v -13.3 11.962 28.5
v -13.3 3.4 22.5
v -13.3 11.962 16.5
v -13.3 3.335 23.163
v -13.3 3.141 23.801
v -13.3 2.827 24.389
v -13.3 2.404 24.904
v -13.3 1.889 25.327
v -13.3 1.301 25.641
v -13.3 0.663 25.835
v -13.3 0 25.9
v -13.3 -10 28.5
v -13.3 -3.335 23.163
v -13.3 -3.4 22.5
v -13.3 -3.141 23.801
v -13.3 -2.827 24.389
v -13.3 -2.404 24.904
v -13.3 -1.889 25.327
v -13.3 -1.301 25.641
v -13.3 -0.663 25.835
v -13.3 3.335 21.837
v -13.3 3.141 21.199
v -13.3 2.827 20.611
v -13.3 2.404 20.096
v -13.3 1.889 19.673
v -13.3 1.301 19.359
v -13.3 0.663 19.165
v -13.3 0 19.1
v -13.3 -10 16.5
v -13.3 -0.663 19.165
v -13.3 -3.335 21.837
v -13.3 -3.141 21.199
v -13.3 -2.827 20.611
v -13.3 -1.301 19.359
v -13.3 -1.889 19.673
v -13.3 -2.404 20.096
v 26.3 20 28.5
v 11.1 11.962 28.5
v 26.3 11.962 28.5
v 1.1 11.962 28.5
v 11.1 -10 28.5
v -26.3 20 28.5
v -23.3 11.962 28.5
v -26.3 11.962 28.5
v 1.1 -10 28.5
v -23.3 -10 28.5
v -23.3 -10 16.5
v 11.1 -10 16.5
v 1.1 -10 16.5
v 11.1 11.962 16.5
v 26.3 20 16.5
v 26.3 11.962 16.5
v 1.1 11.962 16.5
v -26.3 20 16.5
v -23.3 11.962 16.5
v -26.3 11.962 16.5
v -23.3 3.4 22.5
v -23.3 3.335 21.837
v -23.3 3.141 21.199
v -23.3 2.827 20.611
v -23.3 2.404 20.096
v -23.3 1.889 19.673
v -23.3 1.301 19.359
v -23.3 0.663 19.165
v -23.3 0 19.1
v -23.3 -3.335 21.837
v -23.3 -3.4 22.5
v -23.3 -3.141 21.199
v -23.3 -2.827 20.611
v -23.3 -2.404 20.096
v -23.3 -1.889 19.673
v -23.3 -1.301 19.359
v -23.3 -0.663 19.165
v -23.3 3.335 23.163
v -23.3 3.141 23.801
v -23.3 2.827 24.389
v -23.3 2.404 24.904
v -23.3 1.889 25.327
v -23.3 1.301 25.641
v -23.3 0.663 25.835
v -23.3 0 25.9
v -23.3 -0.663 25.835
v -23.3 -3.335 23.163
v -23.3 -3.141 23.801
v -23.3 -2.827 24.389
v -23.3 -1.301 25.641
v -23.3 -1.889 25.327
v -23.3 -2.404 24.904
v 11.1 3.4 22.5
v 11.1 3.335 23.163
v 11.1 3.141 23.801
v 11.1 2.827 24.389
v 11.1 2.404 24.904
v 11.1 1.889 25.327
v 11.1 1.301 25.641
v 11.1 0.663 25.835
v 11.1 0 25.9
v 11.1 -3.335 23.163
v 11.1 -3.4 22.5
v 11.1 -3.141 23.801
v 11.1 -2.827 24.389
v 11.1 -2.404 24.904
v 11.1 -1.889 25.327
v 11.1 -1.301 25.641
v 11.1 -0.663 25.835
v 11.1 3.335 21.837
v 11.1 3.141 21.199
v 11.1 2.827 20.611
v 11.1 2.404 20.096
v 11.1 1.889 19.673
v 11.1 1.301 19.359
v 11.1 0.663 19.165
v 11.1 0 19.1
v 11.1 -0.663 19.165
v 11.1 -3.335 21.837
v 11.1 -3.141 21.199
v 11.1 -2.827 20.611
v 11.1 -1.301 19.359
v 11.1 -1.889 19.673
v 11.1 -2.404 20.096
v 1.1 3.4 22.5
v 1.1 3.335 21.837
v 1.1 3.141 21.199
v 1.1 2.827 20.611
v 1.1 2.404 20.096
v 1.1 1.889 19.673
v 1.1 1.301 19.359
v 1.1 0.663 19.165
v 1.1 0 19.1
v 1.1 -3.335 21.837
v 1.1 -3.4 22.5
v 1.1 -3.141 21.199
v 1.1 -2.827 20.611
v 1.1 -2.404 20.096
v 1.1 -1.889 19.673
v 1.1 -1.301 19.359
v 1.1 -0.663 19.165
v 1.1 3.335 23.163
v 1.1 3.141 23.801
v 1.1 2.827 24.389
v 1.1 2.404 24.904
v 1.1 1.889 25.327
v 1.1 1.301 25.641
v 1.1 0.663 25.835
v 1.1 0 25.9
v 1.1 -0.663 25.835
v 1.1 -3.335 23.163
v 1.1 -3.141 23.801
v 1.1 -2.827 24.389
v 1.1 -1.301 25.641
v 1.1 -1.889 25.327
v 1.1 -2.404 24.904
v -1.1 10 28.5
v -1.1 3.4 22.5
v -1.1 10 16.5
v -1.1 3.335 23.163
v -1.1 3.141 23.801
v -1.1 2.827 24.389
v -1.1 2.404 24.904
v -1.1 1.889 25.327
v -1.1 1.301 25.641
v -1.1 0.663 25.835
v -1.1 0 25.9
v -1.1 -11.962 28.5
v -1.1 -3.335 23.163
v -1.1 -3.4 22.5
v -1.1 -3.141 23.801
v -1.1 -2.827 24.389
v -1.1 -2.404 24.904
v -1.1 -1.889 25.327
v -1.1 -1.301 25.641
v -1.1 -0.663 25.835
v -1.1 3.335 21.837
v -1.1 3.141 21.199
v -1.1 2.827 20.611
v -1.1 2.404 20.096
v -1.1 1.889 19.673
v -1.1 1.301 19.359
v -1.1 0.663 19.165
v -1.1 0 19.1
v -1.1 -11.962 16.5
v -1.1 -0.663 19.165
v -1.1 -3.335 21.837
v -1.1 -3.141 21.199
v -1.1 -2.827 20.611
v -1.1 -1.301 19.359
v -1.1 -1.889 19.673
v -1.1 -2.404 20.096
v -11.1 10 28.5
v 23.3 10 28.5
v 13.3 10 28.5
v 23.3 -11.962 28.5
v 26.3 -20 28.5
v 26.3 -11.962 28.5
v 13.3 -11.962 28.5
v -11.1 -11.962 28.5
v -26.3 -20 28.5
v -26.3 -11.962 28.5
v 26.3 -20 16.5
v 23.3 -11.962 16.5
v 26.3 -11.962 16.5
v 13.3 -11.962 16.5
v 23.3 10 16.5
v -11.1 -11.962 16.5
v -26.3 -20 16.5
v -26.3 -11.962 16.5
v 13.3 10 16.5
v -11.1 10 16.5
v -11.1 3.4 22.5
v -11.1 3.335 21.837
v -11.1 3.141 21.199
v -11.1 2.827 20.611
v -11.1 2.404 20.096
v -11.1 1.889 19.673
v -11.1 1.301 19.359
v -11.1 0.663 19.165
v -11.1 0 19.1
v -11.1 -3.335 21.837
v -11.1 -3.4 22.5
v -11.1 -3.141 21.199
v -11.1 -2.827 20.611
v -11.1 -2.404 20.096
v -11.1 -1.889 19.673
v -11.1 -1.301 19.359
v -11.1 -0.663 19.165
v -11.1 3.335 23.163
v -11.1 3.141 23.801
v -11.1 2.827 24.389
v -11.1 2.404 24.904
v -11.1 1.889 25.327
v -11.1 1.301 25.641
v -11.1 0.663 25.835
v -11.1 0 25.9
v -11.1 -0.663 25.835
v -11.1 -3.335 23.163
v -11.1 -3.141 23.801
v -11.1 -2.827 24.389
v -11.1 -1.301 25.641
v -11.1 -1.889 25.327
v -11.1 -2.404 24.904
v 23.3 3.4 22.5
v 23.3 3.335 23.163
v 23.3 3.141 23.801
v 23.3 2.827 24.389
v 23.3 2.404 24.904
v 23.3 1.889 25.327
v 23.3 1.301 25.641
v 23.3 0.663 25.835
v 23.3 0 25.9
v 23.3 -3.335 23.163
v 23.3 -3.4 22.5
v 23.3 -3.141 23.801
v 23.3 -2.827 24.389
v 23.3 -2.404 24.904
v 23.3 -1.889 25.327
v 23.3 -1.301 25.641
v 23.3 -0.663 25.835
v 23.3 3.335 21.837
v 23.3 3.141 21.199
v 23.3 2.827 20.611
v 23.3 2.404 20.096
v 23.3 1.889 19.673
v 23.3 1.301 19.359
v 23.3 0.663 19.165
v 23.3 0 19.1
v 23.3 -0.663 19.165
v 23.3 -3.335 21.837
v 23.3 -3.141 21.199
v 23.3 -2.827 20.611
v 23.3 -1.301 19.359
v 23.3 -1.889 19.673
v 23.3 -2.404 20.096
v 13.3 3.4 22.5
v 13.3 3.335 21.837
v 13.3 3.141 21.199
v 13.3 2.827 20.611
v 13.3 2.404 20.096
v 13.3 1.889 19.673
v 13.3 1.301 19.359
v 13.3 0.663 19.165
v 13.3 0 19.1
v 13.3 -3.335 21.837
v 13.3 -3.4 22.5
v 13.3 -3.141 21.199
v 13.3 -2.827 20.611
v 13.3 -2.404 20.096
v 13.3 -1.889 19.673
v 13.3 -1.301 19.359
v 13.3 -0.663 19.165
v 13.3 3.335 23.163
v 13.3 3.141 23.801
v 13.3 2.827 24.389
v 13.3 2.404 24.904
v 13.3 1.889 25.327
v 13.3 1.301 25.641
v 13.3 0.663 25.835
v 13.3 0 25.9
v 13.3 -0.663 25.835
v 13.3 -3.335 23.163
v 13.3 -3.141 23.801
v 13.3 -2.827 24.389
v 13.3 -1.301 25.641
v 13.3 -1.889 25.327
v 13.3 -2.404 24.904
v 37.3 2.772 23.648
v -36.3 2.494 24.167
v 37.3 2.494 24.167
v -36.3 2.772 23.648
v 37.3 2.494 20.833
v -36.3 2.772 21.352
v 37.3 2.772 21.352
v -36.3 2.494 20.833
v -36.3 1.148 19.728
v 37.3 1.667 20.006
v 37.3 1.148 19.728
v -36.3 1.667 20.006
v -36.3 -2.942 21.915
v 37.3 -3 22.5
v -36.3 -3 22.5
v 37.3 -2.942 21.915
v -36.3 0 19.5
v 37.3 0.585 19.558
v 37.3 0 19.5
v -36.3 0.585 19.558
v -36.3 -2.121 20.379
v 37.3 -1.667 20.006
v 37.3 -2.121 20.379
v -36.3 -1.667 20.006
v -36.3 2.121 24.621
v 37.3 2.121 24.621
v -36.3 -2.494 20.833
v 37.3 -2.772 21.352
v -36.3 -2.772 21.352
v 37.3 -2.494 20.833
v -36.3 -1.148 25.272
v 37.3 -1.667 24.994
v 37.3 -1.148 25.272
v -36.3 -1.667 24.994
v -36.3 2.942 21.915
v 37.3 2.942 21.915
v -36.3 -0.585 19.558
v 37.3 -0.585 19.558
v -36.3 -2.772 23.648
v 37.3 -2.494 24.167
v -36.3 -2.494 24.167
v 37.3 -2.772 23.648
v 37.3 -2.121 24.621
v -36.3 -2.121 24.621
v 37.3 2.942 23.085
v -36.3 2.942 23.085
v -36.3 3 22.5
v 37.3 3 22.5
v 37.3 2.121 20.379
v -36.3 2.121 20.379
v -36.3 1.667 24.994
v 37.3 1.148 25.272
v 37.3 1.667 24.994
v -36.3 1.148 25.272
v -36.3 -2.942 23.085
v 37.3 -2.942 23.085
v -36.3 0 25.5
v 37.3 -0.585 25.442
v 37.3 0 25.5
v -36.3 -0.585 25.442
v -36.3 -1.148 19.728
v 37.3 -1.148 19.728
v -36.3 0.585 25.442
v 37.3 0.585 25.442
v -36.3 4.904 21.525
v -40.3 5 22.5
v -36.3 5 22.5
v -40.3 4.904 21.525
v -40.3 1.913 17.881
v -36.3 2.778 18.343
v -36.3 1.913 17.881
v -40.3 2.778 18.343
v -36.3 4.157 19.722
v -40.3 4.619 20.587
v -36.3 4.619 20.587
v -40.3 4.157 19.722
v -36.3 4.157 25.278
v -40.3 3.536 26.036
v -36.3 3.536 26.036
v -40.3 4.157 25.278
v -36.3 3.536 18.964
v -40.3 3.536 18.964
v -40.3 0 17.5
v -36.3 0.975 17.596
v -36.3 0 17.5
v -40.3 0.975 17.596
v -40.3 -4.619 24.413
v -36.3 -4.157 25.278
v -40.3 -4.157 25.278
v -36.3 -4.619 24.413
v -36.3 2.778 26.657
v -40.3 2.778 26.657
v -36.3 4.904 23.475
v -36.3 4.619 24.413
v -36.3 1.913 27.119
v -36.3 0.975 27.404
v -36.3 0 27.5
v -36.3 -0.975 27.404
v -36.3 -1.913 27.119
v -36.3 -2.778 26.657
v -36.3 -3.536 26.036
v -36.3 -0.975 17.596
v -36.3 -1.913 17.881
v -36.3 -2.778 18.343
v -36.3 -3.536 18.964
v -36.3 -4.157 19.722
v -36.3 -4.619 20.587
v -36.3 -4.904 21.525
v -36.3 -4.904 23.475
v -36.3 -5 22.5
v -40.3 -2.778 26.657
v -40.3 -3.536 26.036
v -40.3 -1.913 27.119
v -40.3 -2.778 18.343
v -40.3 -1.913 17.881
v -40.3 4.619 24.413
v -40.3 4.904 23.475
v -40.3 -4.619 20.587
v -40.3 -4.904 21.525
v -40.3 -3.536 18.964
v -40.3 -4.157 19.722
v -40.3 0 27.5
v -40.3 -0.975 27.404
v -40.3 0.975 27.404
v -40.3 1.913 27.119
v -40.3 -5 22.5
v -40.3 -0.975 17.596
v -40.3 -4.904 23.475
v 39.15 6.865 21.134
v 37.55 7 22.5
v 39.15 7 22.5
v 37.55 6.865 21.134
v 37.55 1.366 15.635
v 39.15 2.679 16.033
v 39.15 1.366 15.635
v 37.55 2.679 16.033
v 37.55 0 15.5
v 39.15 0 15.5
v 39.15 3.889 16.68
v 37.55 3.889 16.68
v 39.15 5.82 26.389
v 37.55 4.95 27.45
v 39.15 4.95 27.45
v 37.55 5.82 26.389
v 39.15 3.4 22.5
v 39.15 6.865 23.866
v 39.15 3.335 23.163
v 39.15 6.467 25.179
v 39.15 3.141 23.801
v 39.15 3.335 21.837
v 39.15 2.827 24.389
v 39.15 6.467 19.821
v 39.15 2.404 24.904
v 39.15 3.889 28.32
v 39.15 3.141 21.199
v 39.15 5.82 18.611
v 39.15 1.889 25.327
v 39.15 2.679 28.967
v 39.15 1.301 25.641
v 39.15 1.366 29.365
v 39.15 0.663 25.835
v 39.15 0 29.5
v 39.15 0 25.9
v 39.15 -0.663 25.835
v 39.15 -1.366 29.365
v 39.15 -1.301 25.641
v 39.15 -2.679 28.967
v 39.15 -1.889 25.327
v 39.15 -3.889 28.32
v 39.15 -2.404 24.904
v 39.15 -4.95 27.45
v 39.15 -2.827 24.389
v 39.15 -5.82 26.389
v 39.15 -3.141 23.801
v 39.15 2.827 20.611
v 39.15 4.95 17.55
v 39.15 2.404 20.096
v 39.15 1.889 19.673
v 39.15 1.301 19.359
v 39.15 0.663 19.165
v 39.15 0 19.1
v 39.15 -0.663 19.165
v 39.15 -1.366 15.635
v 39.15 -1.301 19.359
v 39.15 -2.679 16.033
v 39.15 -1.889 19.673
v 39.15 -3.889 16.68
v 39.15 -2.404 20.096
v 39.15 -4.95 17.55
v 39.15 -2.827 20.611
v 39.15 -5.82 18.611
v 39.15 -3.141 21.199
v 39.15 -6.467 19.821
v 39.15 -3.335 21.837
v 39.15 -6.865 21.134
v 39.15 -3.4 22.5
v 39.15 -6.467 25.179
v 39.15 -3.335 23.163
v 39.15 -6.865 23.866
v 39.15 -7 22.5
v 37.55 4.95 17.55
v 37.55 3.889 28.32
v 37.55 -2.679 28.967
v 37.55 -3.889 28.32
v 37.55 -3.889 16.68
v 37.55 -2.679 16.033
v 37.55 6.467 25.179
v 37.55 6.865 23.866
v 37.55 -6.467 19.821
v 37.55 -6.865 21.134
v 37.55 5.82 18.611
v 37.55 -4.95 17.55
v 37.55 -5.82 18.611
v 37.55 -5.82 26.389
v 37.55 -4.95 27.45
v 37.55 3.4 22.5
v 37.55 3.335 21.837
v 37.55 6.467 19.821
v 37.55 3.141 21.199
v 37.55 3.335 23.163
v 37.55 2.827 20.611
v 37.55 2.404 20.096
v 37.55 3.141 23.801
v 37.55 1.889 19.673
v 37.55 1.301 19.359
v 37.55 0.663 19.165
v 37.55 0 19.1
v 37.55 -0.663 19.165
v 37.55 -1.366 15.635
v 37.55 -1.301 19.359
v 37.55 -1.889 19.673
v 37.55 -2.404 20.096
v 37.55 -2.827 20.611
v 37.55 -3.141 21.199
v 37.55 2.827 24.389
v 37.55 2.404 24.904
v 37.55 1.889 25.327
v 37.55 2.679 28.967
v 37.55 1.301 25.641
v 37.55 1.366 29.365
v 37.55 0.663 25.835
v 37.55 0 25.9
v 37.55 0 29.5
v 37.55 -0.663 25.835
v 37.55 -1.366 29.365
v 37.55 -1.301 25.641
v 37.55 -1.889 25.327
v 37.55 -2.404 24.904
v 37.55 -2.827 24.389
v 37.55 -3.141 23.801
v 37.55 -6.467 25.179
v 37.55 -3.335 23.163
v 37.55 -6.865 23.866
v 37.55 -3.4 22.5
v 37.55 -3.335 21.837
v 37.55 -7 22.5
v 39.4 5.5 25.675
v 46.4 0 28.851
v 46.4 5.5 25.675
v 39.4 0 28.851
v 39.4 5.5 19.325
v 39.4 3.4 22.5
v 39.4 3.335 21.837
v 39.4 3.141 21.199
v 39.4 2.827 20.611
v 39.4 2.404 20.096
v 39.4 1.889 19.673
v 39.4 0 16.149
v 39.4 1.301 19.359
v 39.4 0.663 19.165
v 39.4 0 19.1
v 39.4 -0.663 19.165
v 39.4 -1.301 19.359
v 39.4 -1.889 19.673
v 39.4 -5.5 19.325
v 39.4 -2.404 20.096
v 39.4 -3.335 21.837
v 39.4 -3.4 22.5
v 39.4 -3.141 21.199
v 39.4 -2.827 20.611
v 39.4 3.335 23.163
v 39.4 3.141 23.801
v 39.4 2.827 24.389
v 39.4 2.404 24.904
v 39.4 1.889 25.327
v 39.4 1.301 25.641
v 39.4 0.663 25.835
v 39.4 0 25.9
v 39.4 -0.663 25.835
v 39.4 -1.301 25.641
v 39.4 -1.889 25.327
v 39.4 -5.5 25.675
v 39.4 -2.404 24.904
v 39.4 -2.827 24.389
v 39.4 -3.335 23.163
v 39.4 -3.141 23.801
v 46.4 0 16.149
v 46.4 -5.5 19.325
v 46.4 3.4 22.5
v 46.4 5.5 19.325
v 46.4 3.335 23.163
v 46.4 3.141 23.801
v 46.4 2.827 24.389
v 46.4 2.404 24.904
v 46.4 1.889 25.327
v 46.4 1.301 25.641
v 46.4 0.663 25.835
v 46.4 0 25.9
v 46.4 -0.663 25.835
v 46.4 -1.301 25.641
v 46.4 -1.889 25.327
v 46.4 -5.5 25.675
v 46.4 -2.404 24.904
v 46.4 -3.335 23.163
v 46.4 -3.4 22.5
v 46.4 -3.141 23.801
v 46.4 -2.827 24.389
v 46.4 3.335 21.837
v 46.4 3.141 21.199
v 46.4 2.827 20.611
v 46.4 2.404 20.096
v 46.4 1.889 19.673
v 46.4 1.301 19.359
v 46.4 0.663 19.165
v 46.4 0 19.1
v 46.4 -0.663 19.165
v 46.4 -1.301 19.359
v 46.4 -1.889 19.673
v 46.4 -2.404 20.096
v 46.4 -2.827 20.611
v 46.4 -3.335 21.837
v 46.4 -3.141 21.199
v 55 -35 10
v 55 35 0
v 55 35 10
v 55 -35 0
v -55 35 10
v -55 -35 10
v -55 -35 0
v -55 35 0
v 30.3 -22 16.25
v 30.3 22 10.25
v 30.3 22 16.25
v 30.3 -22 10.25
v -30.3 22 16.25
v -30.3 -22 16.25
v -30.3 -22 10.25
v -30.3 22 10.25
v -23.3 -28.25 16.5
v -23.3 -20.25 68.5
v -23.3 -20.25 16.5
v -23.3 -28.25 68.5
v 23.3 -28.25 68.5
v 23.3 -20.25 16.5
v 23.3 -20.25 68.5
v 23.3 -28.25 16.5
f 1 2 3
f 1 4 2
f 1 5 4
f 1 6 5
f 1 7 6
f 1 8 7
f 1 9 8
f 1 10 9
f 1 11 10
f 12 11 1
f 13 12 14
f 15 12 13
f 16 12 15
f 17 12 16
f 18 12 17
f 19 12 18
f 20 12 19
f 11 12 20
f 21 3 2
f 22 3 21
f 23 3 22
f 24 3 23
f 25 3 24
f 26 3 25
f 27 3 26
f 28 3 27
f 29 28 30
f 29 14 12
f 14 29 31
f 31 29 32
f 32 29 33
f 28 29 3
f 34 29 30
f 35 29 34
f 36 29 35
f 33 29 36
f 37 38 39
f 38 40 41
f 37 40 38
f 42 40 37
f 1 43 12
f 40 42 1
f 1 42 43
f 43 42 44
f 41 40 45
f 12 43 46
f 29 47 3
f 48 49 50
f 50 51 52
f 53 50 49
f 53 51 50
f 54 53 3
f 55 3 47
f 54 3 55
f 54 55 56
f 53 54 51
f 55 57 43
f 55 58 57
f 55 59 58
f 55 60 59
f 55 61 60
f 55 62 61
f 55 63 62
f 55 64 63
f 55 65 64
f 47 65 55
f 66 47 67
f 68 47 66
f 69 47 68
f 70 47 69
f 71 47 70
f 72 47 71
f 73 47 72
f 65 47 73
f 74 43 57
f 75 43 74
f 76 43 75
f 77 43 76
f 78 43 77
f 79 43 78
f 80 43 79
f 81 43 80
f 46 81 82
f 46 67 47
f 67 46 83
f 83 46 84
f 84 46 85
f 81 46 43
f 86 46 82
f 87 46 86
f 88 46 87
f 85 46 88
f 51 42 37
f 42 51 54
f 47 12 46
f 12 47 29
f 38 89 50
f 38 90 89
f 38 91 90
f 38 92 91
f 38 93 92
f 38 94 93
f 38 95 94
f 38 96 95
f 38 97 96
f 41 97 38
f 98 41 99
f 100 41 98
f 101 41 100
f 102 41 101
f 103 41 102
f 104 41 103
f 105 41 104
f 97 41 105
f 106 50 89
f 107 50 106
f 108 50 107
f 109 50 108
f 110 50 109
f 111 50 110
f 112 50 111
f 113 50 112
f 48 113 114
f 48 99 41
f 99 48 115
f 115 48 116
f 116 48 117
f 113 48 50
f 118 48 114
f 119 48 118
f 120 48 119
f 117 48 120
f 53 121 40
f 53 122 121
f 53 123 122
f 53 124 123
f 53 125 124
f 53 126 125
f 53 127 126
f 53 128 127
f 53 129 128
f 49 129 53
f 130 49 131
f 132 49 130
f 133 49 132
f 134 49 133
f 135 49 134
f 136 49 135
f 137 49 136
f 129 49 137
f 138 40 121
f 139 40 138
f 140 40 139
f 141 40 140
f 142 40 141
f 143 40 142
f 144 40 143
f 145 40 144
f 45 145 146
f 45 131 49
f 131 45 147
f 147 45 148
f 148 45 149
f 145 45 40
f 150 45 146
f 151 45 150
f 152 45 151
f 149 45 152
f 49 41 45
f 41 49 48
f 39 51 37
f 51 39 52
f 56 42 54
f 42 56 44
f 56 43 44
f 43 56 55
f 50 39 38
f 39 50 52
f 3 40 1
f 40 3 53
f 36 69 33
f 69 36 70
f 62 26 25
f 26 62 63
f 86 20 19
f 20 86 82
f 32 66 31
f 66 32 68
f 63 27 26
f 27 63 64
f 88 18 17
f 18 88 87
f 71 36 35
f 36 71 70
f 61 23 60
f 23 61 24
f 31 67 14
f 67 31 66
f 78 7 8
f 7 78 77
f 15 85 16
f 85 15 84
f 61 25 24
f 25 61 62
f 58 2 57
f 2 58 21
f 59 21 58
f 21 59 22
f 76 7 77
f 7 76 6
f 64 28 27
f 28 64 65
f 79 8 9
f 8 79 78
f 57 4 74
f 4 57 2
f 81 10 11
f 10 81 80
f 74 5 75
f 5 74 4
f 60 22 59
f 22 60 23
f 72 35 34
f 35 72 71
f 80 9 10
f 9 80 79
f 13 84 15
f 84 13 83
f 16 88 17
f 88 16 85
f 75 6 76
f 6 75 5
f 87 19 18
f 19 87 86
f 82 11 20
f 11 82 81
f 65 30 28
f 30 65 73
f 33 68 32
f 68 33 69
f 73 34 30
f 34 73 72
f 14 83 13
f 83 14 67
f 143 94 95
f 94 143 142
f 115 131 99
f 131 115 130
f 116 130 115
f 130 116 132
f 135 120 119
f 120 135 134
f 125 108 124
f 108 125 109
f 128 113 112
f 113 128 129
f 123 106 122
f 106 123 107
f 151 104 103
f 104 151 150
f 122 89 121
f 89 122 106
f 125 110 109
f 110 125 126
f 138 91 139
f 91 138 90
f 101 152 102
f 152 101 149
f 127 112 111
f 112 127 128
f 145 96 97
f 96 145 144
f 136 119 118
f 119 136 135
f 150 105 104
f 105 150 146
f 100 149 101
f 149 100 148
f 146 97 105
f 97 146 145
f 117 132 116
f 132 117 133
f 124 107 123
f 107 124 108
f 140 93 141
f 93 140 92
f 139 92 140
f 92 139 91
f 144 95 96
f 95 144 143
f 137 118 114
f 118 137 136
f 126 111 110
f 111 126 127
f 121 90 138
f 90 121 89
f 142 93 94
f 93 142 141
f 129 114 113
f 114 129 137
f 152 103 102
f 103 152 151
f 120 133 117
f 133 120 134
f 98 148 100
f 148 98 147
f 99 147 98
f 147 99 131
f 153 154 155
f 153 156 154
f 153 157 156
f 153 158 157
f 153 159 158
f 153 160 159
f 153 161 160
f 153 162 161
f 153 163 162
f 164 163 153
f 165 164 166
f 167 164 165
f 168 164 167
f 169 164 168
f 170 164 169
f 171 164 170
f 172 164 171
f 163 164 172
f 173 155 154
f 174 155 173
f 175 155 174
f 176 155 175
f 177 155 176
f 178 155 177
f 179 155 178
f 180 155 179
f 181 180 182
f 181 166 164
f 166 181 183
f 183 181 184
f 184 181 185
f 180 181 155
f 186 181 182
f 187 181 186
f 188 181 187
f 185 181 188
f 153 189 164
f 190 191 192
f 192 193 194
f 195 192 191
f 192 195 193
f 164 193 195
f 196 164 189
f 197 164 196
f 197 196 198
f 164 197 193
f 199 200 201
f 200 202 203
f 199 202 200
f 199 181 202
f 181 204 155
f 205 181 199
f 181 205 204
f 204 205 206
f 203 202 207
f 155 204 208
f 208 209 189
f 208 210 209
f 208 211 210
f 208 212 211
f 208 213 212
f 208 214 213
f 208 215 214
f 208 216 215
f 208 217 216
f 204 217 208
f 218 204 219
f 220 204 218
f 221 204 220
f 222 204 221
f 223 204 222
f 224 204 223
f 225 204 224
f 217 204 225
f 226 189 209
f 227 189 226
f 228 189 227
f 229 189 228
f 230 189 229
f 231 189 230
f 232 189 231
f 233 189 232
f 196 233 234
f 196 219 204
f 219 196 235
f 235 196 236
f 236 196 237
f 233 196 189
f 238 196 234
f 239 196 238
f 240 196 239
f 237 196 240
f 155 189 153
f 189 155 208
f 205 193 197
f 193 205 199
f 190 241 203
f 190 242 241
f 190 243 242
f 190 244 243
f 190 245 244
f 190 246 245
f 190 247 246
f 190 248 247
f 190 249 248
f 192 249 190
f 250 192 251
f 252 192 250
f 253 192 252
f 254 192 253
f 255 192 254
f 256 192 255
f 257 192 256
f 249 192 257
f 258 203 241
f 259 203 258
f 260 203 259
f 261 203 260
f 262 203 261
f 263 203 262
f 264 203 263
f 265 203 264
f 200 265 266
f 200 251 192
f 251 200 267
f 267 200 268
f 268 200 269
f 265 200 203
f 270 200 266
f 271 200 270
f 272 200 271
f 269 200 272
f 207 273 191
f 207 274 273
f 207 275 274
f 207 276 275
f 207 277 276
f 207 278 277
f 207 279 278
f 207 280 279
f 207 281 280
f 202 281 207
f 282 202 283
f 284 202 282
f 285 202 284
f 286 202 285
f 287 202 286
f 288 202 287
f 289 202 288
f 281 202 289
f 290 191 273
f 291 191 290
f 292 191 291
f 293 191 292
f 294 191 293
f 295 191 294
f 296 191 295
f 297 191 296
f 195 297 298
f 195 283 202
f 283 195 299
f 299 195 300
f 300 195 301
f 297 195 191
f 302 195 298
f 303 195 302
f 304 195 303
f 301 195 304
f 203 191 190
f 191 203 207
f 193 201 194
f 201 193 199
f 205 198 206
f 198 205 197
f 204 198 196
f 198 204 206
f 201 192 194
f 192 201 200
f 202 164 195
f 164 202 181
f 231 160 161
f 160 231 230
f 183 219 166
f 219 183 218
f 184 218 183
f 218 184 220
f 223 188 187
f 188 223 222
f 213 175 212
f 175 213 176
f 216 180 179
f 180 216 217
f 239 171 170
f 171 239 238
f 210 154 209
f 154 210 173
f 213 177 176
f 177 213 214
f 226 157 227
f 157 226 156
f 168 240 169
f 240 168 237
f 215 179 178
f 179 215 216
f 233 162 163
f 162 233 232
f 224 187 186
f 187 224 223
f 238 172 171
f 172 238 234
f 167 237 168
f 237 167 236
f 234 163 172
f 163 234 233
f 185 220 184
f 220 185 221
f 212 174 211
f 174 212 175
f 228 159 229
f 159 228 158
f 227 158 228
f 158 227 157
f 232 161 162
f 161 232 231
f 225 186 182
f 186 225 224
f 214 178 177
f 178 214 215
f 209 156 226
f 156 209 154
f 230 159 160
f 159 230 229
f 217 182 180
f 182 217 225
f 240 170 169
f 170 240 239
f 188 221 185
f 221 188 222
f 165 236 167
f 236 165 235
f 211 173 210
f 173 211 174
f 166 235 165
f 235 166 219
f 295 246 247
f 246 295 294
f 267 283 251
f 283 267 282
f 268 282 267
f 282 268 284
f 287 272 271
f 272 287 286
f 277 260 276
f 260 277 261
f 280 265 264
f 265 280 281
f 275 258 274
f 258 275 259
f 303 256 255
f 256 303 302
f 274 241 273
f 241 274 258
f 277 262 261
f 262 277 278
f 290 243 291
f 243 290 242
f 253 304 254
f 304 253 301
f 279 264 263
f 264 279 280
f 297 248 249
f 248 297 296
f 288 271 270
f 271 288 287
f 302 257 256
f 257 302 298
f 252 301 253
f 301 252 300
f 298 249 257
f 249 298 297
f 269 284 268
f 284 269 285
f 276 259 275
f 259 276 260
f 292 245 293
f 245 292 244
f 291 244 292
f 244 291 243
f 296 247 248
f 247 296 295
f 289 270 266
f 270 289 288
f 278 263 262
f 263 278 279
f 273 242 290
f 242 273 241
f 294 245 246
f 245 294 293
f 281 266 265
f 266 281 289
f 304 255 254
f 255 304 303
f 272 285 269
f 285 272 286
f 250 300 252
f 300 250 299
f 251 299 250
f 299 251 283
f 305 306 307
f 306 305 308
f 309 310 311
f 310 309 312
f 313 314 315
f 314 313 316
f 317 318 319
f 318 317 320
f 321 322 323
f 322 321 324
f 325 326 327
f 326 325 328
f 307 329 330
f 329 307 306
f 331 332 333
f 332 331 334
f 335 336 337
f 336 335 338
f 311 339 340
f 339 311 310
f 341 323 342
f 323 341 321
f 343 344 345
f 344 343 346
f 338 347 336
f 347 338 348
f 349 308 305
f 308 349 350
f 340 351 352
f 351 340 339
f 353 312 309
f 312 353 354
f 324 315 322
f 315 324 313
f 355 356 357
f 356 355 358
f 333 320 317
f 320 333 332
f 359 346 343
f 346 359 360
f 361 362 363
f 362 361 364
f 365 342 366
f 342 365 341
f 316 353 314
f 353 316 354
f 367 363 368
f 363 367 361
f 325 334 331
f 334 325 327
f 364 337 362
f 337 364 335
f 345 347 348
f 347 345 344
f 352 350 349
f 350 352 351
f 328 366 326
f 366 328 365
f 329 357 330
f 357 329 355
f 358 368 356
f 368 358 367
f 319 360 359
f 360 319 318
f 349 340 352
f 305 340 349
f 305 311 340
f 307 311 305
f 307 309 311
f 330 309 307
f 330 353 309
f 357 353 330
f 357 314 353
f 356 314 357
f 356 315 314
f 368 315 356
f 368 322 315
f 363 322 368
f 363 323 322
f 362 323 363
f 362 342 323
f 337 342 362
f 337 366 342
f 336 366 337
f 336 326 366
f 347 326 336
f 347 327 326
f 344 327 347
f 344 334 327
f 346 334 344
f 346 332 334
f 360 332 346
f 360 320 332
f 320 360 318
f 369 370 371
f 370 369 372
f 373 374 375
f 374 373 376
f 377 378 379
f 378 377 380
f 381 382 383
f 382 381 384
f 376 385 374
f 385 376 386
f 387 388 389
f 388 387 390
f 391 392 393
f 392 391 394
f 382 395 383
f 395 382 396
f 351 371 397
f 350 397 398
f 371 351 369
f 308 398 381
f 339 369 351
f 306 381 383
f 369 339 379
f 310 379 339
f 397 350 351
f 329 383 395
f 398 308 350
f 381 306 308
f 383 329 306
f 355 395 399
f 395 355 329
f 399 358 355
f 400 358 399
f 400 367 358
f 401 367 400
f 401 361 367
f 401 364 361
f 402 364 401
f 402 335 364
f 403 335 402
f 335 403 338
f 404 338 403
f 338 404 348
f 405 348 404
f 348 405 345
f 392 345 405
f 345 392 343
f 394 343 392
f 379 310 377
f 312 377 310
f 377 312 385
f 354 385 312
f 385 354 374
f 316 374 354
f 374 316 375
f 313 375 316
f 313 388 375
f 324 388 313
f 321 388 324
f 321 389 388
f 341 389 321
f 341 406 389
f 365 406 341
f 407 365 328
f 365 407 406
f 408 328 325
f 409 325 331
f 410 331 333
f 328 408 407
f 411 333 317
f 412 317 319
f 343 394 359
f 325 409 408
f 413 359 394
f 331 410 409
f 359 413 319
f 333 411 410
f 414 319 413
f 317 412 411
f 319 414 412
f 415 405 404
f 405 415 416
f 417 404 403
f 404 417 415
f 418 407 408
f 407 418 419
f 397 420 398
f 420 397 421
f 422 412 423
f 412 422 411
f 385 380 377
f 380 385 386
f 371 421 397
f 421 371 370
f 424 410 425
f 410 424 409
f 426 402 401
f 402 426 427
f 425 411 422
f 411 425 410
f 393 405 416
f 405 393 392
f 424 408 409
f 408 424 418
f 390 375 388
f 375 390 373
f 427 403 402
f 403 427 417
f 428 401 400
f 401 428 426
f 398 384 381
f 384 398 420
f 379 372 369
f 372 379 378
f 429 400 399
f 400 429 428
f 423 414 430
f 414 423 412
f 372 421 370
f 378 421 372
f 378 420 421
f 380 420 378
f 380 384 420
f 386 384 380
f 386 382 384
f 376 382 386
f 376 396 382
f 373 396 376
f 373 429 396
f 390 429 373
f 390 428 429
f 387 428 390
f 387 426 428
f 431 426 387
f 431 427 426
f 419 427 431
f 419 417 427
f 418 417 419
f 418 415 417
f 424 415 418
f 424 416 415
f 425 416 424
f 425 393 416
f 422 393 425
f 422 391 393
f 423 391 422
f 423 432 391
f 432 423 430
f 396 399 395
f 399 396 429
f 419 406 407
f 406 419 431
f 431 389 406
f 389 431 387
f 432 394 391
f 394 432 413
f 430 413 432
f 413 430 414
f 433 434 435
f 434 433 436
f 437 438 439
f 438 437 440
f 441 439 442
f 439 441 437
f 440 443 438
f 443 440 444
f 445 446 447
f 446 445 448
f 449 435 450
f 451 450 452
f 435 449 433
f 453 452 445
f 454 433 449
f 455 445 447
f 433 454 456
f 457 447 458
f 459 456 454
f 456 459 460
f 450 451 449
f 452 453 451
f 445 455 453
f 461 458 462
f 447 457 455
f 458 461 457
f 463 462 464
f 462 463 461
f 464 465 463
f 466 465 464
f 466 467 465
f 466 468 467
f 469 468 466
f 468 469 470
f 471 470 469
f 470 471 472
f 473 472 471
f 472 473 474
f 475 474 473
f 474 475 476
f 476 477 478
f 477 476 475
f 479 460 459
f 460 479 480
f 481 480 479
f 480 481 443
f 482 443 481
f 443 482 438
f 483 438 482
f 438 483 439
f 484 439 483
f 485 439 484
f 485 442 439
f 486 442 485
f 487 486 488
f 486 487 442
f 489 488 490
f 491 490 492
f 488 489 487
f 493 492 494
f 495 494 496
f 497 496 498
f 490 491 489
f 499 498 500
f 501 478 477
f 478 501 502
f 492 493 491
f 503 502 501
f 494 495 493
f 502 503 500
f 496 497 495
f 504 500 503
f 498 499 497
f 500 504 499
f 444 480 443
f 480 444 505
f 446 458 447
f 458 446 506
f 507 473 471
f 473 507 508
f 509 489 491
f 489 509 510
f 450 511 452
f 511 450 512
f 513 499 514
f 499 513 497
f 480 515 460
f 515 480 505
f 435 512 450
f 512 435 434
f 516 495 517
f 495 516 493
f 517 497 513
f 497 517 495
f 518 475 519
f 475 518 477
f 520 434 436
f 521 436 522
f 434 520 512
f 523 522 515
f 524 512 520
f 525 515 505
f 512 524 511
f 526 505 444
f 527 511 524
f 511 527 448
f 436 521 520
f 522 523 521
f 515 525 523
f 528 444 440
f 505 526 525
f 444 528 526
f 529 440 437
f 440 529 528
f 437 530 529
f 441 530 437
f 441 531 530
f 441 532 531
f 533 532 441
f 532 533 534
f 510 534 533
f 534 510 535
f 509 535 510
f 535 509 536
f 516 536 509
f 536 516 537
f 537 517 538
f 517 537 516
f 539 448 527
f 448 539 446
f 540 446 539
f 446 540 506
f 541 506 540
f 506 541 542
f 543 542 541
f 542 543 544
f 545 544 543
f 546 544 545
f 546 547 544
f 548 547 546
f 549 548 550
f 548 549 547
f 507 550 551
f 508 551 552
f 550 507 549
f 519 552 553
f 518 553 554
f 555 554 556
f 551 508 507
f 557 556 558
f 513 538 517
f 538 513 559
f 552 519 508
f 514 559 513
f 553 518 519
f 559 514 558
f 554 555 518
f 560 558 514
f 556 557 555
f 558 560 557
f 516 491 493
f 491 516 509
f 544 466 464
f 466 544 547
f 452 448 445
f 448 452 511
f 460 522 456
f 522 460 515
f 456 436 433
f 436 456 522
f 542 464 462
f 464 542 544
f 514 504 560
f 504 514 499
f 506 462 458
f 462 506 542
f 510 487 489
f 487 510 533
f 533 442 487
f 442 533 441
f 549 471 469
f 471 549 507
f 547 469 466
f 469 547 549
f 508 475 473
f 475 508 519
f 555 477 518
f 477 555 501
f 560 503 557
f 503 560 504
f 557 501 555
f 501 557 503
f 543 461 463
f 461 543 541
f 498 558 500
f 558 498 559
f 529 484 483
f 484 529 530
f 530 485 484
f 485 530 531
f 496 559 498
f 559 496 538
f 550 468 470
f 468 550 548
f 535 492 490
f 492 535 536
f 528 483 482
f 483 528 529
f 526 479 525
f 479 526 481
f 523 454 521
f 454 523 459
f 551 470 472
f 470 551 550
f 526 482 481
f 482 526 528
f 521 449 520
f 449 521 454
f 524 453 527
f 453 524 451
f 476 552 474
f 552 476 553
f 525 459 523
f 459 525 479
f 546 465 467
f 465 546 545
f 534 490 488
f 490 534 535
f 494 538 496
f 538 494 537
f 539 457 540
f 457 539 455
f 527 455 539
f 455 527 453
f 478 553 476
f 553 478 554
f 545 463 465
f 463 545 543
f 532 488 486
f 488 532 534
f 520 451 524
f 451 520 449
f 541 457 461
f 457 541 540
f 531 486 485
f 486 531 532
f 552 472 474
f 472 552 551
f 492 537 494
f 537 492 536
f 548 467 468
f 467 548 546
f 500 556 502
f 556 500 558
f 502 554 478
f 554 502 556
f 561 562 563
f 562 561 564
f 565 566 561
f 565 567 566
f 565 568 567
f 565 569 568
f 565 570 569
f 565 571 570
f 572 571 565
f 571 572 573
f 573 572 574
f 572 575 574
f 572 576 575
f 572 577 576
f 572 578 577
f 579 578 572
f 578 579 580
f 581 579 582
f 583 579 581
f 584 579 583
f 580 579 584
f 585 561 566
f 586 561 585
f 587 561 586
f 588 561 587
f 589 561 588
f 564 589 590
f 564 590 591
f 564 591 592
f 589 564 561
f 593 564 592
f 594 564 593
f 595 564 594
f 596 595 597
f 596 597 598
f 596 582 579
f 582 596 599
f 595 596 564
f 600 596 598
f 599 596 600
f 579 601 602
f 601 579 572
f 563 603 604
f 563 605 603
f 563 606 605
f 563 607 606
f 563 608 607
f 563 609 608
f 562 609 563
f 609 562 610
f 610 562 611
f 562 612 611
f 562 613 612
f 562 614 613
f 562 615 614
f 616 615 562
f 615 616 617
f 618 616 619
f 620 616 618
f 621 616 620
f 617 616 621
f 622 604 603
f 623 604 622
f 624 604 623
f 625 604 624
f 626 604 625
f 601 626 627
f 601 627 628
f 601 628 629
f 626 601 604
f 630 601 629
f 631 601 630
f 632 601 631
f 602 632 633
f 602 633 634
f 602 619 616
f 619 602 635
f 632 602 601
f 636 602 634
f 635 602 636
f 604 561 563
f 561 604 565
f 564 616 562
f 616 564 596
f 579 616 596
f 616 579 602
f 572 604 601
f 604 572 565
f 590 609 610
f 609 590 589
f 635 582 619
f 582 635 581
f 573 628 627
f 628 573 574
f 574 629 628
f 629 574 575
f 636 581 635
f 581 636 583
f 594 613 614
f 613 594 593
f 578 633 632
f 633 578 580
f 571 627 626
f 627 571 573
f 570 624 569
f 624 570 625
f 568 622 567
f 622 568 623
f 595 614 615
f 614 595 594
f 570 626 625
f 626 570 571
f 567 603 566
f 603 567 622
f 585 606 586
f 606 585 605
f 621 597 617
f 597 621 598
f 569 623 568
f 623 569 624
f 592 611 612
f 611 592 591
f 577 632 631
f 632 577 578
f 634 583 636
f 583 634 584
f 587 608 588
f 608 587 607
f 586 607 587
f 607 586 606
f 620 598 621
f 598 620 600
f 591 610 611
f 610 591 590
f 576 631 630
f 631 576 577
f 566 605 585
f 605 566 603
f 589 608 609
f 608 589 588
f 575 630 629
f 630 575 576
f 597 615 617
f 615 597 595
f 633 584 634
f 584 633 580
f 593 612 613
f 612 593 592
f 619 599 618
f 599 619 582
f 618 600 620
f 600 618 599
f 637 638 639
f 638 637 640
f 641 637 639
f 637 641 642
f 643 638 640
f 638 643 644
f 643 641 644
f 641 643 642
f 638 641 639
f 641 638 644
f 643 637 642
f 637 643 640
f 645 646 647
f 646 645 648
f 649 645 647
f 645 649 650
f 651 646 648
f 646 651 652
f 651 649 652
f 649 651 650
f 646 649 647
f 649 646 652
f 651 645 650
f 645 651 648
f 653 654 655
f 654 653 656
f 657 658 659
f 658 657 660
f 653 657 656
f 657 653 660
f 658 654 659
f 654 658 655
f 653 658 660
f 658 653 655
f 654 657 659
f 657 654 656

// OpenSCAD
$fn = 32;

// ------------------------------------------------------------------------
// Comb hinge with flap: leaf 52.6 x 20 mm, pin d6, flap 52 mm
// Every part is its own module, assembly() places every instance.
// ------------------------------------------------------------------------

// --- part 1 ---
module hinge_bed() {
  difference() {
    translate([-55, -35, 0]) cube([110, 70, 10]);
  }
}

// --- part 2 ---
module hinge_riser() {
  difference() {
    translate([-30.3, -22, 0]) cube([60.6, 44, 6]);
  }
}

// --- part 3 ---
module hinge_leaf_a() {
  difference() {
    union() {
      translate([-23.3, -10, -6]) cube([10, 30, 12]);
      translate([1.1, -10, -6]) cube([10, 30, 12]);
      translate([-26.3, 11.962, -6]) cube([52.6, 8.038, 12]);
    }
    translate([-18.3, 0, 0]) rotate([0, 90, 0]) cylinder(h = 12, d = 6.8, center = true);
    translate([6.1, 0, 0]) rotate([0, 90, 0]) cylinder(h = 12, d = 6.8, center = true);
  }
}

// --- part 4 ---
module hinge_leaf_b() {
  difference() {
    union() {
      translate([-11.1, -20, -6]) cube([10, 30, 12]);
      translate([13.3, -20, -6]) cube([10, 30, 12]);
      translate([-26.3, -20, -6]) cube([52.6, 8.038, 12]);
    }
    translate([-6.1, 0, 0]) rotate([0, 90, 0]) cylinder(h = 12, d = 6.8, center = true);
    translate([18.3, 0, 0]) rotate([0, 90, 0]) cylinder(h = 12, d = 6.8, center = true);
  }
}

// --- part 5 ---
module hinge_flap() {
  difference() {
    translate([-23.3, -26, 0]) cube([46.6, 52, 8]);
  }
}

// --- part 6 ---
module hinge_pin() {
  rotate([0, 90, 0]) cylinder(h = 74.6, d = 6, center = true);
  translate([-40.3, 0, 0]) rotate([0, 90, 0]) cylinder(h = 4, d = 10);
}

// --- part 7 ---
module pin_washer() {
  difference() {
      translate([0, 0, 0]) cylinder(h = 1.6, d = 14);
      translate([0, 0, -1]) cylinder(h = 3.6, d = 6.8);
    }
}

// --- part 8 ---
module pin_nut() {
  difference() {
    linear_extrude(height = 7) polygon(points = [[6.351, 0], [3.175, 5.5], [-3.175, 5.5], [-6.351, 0], [-3.175, -5.5], [3.175, -5.5]]);
    translate([0, 0, -1]) cylinder(h = 9, d = 6.8);
  }
}

// --- assembly ---
module assembly() {
  color([0.80, 0.24, 0.20]) translate([0, 0, 0]) rotate([0, 0, 0]) hinge_bed();
  color([0.20, 0.45, 0.75]) translate([0, 0, 10.25]) rotate([0, 0, 0]) hinge_riser();
  color([0.25, 0.62, 0.32]) translate([0, 0, 22.5]) rotate([0, 0, 0]) hinge_leaf_a();
  color([0.92, 0.70, 0.18]) translate([0, 0, 22.5]) rotate([0, 0, 0]) hinge_leaf_b();
  color([0.58, 0.35, 0.70]) translate([0, -20.25, 42.5]) rotate([90, 0, 0]) hinge_flap();
  color([0.16, 0.66, 0.66]) translate([0, 0, 22.5]) rotate([0, 0, 0]) hinge_pin();
  color([0.85, 0.48, 0.18]) translate([37.55, 0, 22.5]) rotate([0, 90, 0]) pin_washer();
  color([0.55, 0.60, 0.65]) translate([39.4, 0, 22.5]) rotate([0, 90, 0]) pin_nut();
}

assembly();
